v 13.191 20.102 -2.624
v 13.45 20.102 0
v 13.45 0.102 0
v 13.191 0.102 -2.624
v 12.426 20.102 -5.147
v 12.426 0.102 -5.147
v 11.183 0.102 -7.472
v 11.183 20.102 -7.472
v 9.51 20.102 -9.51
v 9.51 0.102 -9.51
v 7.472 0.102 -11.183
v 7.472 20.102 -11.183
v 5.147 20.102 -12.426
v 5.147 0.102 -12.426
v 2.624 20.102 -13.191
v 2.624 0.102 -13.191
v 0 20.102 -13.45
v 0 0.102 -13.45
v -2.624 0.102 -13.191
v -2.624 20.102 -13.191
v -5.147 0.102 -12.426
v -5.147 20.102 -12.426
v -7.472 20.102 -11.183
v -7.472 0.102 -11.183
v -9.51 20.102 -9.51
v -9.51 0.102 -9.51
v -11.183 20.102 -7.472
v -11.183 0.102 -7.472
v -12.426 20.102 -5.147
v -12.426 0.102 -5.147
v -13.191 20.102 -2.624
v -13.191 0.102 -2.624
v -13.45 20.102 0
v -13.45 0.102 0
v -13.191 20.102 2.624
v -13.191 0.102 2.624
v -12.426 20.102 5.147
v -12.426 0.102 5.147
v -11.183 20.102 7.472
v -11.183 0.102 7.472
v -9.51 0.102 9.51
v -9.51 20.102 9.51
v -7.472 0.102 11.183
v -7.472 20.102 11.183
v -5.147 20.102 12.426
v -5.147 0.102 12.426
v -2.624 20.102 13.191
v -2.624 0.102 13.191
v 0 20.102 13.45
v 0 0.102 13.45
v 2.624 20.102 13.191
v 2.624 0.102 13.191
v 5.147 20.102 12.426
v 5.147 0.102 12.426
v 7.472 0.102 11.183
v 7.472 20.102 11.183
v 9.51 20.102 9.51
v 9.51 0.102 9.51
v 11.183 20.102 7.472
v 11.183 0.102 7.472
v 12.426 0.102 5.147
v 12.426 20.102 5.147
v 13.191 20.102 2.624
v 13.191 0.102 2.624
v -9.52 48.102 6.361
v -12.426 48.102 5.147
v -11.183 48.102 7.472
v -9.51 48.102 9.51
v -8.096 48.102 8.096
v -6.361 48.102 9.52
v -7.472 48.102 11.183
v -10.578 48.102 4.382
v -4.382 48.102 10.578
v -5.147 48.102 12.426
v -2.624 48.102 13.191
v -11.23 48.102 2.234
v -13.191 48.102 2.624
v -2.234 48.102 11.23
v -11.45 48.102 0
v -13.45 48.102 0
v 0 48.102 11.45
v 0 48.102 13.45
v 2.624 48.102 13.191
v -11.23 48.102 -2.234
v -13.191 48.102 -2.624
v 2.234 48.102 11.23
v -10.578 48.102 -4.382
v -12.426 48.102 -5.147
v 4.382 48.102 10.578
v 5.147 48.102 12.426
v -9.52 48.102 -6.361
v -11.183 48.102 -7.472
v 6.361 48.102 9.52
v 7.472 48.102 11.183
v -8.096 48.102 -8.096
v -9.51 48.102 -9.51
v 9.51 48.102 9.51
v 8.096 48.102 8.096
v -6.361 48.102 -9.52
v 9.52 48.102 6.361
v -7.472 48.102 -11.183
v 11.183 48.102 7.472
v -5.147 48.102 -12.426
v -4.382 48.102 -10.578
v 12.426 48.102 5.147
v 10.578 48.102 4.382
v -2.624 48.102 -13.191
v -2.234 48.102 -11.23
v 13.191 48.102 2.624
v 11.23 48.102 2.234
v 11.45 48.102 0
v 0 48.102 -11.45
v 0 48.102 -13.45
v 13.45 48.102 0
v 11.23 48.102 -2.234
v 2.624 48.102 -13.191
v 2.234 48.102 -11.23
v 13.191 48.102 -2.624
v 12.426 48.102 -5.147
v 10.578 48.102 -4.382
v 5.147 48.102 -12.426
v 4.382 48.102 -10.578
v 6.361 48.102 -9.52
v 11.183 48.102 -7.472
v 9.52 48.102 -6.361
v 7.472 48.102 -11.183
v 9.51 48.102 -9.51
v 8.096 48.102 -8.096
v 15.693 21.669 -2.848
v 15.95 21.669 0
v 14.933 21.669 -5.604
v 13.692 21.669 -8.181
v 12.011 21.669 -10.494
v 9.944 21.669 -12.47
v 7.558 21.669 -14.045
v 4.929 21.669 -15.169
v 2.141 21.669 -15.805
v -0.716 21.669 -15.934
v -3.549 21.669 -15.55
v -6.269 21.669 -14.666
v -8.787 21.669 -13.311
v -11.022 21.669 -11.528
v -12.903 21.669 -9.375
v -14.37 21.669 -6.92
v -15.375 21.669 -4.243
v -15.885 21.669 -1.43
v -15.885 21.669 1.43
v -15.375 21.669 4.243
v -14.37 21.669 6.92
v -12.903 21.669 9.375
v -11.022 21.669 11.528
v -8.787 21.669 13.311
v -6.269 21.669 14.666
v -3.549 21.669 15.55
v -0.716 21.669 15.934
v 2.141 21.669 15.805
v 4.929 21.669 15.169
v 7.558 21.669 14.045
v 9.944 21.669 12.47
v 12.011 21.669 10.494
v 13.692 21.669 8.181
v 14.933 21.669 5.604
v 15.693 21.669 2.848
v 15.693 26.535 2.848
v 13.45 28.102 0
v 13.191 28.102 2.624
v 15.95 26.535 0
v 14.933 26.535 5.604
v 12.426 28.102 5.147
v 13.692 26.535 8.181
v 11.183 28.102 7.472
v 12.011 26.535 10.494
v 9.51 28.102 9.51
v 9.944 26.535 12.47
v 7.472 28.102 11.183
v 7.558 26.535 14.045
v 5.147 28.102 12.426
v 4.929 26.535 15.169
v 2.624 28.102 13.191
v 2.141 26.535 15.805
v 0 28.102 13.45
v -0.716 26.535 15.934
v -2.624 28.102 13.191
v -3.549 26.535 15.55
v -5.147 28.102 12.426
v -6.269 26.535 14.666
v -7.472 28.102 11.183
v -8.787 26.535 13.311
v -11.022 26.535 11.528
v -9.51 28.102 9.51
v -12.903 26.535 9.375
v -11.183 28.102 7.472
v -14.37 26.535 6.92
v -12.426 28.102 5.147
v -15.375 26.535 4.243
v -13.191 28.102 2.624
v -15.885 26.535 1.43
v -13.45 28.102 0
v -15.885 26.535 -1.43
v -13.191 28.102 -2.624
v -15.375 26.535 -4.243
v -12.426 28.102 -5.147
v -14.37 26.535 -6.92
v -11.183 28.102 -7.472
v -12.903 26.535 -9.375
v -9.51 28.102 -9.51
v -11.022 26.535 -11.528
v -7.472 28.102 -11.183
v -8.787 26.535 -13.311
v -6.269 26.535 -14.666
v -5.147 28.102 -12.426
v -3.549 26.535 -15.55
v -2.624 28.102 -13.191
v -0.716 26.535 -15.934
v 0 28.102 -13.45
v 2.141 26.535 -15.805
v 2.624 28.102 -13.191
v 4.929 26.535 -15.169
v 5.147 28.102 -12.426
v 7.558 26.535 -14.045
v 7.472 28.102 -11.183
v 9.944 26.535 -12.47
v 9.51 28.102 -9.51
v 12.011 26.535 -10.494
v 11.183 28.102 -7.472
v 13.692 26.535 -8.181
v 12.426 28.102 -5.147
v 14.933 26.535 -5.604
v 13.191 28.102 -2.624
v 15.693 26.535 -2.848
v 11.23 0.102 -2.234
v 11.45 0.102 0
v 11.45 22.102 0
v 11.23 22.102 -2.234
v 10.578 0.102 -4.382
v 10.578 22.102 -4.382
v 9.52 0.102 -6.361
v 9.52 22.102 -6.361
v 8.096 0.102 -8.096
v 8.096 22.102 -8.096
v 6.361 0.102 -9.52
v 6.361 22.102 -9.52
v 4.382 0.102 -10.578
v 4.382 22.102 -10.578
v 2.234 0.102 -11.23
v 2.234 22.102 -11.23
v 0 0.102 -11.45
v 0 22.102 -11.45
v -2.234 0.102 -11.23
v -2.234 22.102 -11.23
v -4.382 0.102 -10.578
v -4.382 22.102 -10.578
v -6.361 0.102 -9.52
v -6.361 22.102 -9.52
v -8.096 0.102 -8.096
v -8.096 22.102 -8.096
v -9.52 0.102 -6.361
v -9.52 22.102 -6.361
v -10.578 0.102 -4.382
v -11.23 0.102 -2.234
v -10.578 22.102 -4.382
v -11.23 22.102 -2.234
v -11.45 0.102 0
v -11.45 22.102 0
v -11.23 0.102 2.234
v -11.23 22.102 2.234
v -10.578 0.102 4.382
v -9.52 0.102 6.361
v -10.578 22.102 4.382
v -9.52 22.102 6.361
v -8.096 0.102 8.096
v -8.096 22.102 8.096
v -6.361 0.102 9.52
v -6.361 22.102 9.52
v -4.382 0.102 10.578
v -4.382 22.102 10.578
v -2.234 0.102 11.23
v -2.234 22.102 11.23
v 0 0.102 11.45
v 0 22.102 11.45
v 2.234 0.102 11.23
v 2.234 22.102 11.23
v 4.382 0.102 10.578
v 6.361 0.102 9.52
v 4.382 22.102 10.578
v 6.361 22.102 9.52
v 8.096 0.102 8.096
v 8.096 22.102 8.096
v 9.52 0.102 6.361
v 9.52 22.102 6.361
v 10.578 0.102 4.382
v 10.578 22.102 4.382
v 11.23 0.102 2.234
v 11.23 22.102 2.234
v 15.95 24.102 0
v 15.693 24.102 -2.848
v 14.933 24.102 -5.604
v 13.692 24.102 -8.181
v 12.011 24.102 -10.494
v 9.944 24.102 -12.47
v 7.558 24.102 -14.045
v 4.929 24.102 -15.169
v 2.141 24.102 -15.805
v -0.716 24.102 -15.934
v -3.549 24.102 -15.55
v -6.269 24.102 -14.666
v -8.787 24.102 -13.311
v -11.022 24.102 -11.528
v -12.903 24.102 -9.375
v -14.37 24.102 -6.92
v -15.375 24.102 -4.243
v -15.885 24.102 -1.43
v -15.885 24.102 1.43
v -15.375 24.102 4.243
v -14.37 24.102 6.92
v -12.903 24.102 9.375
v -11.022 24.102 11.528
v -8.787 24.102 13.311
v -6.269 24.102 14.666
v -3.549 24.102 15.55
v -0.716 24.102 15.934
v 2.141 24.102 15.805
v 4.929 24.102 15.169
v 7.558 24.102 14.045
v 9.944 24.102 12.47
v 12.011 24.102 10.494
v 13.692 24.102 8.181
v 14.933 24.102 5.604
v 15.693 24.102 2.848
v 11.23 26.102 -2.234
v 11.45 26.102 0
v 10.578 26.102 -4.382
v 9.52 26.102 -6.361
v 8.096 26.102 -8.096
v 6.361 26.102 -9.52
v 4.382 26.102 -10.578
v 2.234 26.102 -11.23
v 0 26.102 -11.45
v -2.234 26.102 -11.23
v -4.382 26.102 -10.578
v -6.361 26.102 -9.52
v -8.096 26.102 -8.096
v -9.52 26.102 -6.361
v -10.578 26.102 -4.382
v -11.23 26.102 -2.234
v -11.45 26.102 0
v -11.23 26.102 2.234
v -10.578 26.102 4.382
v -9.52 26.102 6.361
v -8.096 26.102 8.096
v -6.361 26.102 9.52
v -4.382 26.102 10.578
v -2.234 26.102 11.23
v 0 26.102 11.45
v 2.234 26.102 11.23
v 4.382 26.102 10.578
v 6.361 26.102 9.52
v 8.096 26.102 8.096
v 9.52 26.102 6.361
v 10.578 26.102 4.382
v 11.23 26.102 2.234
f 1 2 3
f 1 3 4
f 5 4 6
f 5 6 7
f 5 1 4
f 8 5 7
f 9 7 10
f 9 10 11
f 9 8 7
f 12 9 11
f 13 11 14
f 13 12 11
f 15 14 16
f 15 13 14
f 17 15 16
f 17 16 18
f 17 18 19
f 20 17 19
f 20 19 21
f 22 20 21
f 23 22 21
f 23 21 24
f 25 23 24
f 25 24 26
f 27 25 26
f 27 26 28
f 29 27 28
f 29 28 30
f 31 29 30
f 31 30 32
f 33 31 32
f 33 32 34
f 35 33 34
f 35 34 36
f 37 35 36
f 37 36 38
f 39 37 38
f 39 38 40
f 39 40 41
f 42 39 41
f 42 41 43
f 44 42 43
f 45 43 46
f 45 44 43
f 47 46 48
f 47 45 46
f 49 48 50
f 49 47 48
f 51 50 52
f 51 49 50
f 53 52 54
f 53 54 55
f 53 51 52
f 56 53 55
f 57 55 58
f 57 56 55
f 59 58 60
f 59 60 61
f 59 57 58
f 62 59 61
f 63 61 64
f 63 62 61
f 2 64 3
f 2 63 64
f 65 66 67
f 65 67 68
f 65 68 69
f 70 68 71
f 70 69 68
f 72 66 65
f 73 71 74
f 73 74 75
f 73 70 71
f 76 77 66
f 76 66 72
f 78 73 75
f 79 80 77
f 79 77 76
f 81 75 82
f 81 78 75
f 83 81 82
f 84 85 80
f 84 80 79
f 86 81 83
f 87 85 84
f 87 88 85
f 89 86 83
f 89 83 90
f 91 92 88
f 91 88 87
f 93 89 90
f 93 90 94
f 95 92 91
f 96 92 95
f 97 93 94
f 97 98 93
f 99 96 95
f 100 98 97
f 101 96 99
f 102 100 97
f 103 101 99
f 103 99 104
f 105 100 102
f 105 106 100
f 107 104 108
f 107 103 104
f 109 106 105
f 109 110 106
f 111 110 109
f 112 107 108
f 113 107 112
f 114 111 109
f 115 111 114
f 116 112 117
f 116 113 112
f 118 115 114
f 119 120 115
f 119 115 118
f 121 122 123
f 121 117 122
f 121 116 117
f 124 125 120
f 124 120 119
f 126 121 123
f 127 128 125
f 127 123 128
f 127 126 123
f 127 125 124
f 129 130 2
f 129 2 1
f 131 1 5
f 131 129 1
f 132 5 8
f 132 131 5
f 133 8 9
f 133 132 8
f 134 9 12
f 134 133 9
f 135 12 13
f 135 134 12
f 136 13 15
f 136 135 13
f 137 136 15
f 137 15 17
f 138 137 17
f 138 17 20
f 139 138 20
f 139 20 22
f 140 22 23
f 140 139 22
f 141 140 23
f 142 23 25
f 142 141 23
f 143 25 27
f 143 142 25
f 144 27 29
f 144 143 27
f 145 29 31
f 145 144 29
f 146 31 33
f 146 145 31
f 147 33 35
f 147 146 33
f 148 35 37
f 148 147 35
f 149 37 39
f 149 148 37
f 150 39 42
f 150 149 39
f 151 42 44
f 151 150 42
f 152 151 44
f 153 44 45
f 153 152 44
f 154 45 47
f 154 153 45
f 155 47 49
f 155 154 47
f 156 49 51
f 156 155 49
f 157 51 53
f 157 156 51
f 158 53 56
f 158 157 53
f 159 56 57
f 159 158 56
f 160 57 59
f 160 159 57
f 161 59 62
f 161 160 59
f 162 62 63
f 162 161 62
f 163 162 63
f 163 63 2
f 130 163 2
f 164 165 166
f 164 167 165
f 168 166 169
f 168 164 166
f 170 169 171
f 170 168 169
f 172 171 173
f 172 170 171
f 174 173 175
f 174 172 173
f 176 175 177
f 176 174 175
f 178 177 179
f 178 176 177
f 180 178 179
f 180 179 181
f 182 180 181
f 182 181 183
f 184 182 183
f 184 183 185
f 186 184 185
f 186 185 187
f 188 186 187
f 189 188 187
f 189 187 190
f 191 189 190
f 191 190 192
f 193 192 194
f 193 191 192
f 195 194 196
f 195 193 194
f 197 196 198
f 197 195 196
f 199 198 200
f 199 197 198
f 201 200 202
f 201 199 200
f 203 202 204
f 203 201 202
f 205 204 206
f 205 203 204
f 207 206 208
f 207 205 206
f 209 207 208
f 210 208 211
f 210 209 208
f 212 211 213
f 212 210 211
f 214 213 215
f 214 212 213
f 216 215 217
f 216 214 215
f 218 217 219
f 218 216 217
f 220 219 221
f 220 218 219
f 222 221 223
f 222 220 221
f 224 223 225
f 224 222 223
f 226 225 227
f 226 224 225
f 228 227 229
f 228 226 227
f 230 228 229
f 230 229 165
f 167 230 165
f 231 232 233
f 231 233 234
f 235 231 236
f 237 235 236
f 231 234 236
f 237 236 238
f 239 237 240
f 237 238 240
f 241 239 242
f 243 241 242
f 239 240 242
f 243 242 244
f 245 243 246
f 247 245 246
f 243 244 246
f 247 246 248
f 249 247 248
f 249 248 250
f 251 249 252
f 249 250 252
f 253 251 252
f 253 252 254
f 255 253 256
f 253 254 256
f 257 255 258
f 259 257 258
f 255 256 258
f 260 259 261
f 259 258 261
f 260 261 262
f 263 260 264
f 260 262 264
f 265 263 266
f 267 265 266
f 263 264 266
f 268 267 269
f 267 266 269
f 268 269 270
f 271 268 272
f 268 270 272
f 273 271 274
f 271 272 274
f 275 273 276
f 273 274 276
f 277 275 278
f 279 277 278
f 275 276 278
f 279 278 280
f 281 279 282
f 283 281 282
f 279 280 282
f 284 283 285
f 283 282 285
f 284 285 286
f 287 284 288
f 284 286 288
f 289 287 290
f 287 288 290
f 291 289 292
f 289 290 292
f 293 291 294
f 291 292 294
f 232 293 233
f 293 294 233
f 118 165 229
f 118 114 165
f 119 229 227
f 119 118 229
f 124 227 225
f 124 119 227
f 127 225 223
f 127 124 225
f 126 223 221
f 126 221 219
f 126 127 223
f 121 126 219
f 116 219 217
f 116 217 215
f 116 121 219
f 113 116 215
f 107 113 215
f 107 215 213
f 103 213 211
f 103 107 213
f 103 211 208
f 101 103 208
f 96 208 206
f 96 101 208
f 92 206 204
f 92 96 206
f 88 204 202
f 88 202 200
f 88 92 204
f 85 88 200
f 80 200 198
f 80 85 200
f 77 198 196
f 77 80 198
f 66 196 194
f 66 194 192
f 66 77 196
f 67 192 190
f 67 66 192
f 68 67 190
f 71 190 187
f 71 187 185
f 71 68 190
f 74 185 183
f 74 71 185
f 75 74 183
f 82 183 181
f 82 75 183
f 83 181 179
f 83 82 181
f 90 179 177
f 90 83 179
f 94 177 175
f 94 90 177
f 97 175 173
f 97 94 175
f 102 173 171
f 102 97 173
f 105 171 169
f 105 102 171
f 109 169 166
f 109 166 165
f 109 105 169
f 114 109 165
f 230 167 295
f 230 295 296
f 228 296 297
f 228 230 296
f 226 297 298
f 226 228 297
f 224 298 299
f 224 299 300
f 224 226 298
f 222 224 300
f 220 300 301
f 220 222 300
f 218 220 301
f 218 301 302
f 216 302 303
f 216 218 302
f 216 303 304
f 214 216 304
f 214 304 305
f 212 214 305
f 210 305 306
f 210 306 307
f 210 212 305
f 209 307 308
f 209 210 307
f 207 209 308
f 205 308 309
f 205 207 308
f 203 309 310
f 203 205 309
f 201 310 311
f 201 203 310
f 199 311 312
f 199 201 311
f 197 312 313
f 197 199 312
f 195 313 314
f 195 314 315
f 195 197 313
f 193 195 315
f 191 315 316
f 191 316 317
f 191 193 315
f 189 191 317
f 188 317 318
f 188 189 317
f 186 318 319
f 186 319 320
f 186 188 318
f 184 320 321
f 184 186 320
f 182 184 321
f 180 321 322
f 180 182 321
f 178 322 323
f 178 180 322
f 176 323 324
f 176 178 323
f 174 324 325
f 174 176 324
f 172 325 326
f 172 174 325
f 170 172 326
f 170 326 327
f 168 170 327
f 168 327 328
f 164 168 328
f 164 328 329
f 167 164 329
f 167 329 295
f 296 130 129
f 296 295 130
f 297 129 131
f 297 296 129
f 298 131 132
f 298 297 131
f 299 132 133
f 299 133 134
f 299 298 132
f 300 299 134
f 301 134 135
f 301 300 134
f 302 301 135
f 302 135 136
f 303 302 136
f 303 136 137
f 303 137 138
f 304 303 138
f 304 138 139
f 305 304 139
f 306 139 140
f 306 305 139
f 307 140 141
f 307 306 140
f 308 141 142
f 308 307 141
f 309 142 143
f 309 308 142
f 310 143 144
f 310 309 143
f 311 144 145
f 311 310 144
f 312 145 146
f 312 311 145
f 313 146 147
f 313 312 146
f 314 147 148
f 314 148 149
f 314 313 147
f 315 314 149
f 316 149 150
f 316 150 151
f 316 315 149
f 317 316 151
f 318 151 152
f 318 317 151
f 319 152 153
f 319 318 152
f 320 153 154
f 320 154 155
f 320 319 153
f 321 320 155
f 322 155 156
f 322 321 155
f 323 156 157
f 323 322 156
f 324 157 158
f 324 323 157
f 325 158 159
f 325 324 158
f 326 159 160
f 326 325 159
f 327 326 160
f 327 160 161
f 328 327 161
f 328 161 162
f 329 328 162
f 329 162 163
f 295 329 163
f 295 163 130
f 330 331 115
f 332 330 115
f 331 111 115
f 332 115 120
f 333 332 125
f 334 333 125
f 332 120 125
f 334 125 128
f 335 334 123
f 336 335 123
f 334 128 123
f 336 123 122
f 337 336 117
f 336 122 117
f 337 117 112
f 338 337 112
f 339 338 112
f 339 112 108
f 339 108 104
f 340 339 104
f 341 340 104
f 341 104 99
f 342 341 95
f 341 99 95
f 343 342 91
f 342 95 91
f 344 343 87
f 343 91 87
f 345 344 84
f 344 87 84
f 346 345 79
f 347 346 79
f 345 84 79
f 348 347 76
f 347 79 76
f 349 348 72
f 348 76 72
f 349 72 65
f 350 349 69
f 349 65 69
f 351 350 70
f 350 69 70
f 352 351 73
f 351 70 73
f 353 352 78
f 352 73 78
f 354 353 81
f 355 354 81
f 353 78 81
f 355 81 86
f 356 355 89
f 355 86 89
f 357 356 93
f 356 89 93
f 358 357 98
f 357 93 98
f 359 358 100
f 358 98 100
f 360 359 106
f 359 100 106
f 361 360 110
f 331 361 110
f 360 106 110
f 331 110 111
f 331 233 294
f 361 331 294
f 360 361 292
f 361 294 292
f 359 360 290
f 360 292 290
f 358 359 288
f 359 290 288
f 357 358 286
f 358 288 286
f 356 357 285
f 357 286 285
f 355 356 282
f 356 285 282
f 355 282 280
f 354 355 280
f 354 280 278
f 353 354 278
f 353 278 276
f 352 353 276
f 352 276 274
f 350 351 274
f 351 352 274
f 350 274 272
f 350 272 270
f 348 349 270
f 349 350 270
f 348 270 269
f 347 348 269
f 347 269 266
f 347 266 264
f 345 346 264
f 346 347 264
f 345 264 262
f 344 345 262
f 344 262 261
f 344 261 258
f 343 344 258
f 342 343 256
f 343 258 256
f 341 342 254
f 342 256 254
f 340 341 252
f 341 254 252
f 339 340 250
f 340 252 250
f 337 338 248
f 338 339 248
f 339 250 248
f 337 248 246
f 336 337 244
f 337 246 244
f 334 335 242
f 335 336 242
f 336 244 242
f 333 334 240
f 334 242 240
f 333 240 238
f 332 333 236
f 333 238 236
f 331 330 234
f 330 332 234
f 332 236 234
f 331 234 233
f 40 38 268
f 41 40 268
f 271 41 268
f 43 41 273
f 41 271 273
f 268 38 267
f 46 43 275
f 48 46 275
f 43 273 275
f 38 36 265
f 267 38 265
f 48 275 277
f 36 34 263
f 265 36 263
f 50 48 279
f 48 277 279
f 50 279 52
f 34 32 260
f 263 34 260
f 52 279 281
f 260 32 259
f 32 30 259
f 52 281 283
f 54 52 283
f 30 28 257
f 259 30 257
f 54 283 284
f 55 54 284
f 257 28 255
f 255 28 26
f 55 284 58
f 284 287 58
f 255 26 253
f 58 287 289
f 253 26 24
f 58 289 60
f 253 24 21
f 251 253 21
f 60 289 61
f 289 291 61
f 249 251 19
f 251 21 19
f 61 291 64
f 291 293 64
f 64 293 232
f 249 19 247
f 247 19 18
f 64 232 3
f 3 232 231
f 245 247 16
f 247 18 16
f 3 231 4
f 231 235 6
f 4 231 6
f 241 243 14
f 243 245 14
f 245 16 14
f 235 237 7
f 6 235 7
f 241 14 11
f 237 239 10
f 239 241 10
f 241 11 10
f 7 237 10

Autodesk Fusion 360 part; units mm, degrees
sketch "Sketch2" plane through (0, 0, 0) normal (0, 0, 1) x (1, 0, 0)
  line L0 (0, 0) -> (0, 65)
  line L1 (13.4496, 0.1022) -> (13.4496, 20.1022)
  line L2 (13.4496, 20.1022) -> (15.9496, 20.1022)
  line L3 (15.9496, 20.1022) -> (15.9496, 28.1022)
  line L4 (15.9496, 28.1022) -> (13.4496, 28.1022)
  line L5 (13.4496, 28.1022) -> (13.4496, 48.1022)
  line L6 (11.4496, 0.1022) -> (11.4496, 22.1022)
  line L7 (11.4496, 22.1022) -> (13.9496, 22.1022)
  line L8 (13.9496, 22.1022) -> (13.9496, 26.1022)
  line L9 (13.9496, 26.1022) -> (11.4496, 26.1022)
  line L10 (11.4496, 26.1022) -> (11.4496, 48.1022)
  line L11 (13.4496, 48.1022) -> (11.4496, 48.1022)
  line L12 (11.4496, 0.1022) -> (13.4496, 0.1022)
  line L13 (11.4496, 26.1022) -> (11.4496, 22.1022)
  line L14 (13.4496, 20.1022) -> (15.9496, 21.6691)
  line L15 (15.9496, 24.1022) -> (11.5, 24.1022)
  line L16 (13.4496, 28.1022) -> (15.9496, 26.5353)
  dimension "d2" = 13.45
  dimension "d3" = 20
  dimension "d4" = 20
  dimension "d5" = 8
  dimension "d6" = 2.5
  dimension "d7" = -2
revolve "Revolve1" add sketch "Sketch2" angle 360 about axis through (0, 0, 0) along (0, 1, 0) contours L1 L3 L6 L7 L8 L12 L14 L15 | L7 L8 L9 L13 | L3 L5 L8 L9 L10 L11 L15 L16
equation "d2 = ( 26.9 / 2 ) * 1 mm"
equation "d4 = d3"
